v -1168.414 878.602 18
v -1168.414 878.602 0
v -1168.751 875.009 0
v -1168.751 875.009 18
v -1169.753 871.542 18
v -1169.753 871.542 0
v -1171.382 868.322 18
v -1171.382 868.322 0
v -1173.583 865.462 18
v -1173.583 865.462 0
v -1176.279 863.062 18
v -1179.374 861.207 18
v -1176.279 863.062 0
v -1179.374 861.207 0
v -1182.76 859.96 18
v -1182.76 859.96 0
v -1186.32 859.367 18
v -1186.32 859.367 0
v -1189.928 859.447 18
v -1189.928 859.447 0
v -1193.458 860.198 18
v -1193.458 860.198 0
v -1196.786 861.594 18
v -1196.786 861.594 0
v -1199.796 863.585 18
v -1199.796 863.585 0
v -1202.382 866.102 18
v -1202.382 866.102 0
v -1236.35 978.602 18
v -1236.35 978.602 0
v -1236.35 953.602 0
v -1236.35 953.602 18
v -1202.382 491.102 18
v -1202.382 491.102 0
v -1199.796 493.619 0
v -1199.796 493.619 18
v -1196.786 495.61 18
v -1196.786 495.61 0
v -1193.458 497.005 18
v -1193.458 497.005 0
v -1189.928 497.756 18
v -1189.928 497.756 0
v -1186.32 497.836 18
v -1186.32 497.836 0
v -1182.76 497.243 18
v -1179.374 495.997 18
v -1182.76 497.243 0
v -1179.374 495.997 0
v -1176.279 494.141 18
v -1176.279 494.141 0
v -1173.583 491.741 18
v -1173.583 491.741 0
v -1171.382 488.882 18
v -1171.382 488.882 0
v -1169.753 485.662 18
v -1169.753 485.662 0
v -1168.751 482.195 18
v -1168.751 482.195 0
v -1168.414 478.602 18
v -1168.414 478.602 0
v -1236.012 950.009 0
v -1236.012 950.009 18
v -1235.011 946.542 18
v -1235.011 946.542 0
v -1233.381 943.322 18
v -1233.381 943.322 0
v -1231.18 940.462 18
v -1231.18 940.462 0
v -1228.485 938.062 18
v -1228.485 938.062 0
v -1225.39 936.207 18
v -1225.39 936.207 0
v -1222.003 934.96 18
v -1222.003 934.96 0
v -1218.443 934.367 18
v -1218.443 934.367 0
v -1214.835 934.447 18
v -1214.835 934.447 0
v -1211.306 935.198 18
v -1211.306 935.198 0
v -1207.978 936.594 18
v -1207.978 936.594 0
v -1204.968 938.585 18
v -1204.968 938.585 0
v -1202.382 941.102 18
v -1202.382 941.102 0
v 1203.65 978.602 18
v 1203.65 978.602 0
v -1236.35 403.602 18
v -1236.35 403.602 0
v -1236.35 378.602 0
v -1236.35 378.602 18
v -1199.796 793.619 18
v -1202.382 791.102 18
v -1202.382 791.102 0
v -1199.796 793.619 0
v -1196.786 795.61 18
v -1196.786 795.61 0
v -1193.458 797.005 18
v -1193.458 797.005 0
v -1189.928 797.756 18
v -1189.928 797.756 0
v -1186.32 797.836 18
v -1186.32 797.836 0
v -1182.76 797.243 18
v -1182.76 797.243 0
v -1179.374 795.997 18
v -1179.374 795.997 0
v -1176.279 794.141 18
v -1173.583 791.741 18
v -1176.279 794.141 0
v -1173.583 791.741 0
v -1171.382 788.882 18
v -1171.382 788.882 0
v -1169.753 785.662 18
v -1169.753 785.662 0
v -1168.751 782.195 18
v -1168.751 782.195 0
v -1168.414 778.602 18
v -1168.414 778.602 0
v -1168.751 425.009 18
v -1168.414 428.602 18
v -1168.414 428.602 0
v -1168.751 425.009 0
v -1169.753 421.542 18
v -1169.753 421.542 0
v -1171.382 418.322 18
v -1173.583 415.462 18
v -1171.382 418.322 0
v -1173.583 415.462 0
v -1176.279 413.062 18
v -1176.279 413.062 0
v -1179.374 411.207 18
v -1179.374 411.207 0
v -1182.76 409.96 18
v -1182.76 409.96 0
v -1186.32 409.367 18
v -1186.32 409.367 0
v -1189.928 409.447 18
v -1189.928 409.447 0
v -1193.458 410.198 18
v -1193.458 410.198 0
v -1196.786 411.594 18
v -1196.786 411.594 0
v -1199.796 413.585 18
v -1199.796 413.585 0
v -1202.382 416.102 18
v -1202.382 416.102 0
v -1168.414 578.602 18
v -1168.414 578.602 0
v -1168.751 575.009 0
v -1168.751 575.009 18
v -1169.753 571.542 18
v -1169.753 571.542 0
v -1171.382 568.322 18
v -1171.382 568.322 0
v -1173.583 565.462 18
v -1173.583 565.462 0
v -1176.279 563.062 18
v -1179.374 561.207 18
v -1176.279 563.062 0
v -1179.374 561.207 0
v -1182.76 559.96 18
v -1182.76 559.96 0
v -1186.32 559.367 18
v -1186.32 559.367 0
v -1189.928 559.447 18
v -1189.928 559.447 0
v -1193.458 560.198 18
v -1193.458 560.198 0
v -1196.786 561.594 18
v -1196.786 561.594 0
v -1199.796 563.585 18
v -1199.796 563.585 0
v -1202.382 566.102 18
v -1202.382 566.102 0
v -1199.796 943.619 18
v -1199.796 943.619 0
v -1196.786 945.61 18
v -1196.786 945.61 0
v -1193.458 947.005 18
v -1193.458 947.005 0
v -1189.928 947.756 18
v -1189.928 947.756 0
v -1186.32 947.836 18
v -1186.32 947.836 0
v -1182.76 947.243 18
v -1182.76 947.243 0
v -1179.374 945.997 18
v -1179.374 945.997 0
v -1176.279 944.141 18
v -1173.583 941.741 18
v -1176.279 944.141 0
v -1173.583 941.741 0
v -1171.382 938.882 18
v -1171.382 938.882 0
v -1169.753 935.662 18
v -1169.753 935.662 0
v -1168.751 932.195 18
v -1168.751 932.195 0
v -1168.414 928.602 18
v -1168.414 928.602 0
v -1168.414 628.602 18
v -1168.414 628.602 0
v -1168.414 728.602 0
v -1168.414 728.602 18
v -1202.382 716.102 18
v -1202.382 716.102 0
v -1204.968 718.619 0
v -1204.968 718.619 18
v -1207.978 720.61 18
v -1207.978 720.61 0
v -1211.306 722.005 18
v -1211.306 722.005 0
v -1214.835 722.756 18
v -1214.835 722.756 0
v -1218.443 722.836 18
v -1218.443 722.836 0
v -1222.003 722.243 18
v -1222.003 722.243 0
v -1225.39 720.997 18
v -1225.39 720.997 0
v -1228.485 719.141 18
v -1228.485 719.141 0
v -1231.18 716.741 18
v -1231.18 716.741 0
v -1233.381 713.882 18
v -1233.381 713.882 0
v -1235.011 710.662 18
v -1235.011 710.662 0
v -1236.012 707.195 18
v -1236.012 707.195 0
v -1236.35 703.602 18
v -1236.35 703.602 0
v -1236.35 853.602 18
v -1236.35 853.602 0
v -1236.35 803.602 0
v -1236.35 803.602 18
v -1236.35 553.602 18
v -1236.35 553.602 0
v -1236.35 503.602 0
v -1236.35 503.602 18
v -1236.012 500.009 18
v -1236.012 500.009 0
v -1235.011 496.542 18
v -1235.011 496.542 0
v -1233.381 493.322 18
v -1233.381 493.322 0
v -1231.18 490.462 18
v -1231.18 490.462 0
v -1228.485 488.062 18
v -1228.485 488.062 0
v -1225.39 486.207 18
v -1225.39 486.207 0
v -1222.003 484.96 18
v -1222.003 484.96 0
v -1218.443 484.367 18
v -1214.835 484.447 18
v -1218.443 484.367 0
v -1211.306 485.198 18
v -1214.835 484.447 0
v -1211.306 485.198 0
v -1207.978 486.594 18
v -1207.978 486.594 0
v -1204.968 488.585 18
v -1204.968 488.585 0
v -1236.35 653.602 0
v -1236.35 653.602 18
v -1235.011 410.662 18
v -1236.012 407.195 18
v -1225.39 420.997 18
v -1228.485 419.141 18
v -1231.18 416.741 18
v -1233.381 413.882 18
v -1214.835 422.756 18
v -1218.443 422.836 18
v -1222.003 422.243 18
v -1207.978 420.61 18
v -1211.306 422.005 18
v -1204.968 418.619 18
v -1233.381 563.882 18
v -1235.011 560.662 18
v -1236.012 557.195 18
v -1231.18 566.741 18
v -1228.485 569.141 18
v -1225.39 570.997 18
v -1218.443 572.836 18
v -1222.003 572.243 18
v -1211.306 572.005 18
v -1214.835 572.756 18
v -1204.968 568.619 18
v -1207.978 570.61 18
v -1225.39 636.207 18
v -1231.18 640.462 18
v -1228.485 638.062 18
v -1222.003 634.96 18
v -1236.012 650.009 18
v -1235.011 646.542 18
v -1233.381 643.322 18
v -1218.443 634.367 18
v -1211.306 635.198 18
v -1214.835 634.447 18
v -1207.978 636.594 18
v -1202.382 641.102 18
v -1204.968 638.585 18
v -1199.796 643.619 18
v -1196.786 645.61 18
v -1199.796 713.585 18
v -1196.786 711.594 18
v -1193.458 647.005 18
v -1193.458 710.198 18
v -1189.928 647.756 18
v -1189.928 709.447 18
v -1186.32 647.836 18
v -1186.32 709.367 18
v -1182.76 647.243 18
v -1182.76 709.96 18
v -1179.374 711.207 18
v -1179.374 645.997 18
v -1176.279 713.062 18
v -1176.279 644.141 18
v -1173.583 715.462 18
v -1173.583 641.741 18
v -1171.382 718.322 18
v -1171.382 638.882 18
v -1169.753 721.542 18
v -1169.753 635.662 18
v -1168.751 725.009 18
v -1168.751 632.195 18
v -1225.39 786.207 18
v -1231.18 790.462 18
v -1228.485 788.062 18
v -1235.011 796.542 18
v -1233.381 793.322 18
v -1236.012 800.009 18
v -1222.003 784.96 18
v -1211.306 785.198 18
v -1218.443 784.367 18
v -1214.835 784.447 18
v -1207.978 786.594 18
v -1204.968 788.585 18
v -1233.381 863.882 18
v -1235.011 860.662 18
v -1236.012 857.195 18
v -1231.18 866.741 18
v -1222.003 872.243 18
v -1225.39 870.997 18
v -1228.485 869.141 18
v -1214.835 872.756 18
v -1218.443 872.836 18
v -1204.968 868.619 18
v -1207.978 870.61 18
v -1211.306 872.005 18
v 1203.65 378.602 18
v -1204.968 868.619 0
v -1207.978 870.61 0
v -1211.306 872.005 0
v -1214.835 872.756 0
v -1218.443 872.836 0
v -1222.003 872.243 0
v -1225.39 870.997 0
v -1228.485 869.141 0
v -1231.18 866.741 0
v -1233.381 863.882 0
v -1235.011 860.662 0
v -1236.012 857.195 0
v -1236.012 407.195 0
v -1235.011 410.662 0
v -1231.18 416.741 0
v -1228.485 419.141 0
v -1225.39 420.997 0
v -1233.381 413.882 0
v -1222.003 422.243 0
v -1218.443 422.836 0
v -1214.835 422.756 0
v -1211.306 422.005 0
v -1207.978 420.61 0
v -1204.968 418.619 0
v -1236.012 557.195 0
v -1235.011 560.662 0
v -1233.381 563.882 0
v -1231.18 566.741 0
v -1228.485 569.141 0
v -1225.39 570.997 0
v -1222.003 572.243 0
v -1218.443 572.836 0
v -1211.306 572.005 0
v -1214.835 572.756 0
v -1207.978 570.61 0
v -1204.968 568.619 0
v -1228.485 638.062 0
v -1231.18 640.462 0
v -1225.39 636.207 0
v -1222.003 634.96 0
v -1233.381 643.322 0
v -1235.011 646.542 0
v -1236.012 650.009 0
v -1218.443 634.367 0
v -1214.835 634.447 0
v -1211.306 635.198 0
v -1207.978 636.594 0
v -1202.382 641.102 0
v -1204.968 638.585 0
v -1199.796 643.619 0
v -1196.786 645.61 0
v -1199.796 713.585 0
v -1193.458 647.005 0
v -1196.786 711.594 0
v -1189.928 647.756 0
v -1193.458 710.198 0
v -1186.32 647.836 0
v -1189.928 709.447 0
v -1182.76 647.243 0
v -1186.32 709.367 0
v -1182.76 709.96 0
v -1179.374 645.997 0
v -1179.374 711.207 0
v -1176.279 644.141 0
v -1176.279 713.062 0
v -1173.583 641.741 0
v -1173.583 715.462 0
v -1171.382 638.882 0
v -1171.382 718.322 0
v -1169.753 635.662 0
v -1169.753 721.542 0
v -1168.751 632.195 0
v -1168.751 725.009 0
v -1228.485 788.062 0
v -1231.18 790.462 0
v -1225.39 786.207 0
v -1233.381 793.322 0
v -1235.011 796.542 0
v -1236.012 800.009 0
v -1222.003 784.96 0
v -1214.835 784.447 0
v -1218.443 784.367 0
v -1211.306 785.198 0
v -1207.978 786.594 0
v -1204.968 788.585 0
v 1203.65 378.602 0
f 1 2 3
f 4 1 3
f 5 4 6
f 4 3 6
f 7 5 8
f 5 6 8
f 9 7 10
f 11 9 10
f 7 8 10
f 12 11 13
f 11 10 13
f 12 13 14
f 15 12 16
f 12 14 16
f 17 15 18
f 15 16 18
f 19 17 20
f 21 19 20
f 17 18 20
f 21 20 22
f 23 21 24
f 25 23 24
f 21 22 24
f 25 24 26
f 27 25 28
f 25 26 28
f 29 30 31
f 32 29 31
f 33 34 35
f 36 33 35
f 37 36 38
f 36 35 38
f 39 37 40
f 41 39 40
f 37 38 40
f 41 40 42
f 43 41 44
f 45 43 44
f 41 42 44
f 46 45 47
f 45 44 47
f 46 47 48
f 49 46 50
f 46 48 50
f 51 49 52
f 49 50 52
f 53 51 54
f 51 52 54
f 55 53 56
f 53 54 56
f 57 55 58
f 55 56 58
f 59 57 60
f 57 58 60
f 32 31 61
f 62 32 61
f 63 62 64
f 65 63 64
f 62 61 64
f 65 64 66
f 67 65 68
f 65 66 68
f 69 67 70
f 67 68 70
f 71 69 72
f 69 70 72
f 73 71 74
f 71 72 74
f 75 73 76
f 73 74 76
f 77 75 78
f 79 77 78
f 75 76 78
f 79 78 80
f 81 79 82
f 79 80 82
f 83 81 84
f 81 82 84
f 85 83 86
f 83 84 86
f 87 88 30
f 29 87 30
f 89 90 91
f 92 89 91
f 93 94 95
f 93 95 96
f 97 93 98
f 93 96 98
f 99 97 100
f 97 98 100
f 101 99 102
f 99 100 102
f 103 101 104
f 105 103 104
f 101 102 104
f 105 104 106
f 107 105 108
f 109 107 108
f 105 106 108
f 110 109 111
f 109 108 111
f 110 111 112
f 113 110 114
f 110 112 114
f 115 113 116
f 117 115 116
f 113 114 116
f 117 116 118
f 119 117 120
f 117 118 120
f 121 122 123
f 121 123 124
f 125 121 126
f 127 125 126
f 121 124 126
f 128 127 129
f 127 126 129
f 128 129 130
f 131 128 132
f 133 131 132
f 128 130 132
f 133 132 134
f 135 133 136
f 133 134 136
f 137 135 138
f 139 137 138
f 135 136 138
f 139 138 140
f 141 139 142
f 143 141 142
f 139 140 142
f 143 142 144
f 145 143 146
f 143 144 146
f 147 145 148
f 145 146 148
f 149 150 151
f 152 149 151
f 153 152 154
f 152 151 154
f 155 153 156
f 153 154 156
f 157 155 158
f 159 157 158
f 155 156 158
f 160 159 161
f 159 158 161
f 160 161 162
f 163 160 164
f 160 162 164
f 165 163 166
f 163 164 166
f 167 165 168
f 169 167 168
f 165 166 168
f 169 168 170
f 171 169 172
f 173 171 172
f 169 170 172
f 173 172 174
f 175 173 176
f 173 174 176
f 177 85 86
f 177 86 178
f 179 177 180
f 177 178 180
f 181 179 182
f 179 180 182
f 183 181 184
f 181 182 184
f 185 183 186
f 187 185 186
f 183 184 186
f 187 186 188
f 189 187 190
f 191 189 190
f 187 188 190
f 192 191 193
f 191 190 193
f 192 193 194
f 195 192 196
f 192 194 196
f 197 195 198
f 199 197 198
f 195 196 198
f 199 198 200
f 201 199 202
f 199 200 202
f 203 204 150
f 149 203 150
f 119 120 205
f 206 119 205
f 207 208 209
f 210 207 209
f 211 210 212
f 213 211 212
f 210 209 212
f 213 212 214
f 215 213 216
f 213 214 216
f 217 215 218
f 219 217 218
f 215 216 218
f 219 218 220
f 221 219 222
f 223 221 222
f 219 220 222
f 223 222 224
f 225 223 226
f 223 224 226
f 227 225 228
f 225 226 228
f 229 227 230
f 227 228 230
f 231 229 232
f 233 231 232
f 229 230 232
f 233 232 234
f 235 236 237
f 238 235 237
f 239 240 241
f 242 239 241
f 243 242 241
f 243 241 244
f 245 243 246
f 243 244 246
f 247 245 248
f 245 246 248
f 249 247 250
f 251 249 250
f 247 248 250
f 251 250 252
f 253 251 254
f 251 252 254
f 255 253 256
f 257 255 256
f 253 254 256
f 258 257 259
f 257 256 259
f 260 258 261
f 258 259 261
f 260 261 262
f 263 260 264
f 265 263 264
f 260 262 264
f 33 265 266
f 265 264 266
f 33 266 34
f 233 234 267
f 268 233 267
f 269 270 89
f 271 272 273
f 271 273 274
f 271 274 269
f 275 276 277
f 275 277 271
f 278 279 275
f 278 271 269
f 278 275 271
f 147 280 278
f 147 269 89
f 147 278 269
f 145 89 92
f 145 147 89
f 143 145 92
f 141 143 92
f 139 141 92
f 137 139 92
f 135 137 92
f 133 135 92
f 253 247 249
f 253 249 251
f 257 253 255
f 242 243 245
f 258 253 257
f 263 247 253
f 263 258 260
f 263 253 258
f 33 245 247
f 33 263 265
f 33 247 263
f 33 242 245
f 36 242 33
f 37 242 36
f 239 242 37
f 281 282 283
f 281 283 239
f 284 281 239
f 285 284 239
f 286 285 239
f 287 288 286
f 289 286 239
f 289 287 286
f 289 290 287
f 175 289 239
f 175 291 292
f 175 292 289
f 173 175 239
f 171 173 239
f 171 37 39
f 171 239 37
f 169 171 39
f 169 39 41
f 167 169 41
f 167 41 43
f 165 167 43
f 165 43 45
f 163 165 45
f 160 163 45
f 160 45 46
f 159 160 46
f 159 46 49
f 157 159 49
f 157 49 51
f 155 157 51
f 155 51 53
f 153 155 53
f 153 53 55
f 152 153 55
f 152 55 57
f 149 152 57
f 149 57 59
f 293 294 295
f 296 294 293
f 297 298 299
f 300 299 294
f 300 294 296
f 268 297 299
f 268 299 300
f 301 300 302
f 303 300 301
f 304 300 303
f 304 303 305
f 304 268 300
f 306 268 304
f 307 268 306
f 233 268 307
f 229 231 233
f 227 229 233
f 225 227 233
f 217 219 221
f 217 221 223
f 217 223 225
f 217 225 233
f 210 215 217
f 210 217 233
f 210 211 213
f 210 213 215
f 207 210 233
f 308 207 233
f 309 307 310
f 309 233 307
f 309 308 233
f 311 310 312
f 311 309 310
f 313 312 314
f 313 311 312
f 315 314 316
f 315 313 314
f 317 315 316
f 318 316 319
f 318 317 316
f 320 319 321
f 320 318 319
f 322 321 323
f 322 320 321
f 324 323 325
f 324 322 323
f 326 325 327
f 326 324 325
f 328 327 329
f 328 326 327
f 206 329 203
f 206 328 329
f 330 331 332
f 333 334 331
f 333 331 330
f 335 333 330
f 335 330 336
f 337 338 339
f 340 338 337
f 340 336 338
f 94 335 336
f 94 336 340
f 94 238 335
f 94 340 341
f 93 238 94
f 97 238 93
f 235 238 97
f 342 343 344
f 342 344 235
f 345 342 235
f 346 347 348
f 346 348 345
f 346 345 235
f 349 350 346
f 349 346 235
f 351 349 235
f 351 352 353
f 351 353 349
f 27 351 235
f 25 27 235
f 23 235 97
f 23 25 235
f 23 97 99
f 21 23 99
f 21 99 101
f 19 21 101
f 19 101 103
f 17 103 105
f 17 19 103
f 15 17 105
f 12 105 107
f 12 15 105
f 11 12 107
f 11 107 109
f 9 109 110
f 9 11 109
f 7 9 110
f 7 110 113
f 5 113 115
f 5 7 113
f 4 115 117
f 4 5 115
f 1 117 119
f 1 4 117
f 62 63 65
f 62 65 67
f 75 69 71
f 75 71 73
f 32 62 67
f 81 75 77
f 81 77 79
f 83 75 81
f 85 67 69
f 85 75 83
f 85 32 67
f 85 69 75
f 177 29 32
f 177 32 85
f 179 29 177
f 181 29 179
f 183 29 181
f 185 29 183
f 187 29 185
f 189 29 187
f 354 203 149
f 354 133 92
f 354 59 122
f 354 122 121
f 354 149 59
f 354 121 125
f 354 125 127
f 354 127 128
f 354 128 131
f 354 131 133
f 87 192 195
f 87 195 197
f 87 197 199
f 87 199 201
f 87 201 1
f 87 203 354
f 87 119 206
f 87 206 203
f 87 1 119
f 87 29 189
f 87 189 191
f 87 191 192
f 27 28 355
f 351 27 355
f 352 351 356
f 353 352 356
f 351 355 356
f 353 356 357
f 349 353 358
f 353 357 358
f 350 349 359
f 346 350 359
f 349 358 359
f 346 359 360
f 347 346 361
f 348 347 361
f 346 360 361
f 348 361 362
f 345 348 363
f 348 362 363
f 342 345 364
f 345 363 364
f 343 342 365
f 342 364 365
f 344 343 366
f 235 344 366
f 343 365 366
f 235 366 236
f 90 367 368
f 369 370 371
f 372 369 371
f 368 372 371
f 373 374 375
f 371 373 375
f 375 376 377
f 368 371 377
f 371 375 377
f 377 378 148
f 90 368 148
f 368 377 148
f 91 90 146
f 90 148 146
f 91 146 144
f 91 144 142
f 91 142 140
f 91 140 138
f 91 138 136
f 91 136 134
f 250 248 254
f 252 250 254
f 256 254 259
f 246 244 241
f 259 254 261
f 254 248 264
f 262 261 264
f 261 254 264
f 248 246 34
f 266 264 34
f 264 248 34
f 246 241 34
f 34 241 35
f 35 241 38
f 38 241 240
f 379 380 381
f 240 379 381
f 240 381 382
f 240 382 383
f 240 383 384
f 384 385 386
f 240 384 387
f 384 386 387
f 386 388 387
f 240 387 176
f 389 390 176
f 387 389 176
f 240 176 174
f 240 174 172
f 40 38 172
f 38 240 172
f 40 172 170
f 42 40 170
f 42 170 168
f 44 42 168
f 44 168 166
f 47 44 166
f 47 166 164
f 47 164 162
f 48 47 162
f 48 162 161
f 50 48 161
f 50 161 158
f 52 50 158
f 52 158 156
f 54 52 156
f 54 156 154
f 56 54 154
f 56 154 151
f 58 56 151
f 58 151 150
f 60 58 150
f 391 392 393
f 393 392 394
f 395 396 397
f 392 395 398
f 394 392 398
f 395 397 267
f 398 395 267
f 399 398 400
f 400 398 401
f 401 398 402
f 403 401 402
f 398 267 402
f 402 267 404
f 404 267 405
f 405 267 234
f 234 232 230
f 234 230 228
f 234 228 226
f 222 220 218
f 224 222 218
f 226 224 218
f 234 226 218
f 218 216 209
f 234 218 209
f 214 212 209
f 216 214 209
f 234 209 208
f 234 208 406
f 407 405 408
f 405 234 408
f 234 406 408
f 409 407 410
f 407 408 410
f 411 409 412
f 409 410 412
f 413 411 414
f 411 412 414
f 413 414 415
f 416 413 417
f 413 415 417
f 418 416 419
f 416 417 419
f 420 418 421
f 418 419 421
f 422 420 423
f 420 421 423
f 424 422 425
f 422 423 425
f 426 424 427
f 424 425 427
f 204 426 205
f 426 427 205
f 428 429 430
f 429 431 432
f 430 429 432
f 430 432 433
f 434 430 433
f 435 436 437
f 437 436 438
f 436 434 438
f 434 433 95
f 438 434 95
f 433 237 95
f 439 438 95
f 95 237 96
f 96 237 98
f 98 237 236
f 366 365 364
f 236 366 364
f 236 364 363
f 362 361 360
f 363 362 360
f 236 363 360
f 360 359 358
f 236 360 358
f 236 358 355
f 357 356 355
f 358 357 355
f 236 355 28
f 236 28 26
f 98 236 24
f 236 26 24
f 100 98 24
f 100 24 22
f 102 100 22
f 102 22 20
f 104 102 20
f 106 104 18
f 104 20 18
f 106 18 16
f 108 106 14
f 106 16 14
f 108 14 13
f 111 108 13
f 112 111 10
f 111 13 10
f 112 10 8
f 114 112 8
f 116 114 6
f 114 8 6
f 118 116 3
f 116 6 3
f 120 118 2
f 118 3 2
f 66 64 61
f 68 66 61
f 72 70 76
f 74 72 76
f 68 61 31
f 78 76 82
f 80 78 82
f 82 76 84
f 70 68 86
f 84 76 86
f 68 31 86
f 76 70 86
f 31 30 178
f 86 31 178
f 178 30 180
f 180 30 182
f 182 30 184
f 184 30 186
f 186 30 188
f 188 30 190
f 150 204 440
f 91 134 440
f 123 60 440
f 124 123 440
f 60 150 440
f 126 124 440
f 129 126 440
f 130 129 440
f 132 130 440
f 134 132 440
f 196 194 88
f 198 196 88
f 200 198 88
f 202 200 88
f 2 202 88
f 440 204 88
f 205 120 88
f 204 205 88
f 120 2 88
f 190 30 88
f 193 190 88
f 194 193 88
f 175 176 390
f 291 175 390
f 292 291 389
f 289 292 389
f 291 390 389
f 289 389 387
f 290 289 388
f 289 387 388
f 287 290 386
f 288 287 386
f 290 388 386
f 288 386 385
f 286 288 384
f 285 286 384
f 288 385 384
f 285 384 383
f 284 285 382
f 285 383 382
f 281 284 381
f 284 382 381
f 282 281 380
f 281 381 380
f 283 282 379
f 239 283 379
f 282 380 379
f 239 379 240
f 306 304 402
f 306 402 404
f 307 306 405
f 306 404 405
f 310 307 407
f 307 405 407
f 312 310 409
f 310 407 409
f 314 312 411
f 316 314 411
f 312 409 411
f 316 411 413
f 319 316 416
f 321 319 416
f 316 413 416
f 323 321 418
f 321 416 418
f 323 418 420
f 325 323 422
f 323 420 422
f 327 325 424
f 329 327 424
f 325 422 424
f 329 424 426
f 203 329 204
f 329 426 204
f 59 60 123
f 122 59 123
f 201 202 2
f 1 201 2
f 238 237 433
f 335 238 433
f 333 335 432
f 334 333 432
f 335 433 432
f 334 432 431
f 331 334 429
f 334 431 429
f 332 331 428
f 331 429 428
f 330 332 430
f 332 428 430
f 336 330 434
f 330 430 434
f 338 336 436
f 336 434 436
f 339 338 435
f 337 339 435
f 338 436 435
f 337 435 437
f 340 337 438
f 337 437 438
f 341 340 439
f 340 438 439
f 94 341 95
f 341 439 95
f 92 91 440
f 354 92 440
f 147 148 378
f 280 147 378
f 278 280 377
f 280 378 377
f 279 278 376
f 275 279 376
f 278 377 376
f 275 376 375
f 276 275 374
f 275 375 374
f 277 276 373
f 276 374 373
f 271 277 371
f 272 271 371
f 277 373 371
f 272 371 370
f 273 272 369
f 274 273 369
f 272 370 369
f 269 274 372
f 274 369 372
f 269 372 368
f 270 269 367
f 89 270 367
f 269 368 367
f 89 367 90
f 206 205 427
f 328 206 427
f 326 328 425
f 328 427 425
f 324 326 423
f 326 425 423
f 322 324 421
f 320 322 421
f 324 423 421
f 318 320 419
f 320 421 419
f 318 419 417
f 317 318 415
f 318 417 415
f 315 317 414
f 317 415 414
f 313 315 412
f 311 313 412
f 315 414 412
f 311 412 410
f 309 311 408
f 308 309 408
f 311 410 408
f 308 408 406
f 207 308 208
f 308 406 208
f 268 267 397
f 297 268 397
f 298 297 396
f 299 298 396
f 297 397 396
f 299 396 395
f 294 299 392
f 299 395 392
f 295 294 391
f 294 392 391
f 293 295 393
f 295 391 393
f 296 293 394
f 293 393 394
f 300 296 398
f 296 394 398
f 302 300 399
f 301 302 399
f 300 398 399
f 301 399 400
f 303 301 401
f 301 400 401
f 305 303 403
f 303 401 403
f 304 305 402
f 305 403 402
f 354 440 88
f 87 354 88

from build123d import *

# Parameters (mm, degrees)
F1_DEPTH = 18


with BuildPart() as f1:
    # F0 (on Top) → F1 (new body)
    with BuildSketch(Plane.XY):
        with BuildLine():
            Line((1203.650336, 978.601654), (-1236.349664, 978.601654))
            Line((-1236.349664, 978.601654), (-1236.349664, 953.601654))
            ThreePointArc((-1236.349664, 953.601654), (-1223.725461, 935.504177), (-1202.381669, 941.101654))
            ThreePointArc((-1202.381669, 941.101654), (-1181.037877, 946.699132), (-1168.413673, 928.601654))
            Line((-1168.413673, 928.601654), (-1168.413673, 903.601654))
            Line((-1168.413673, 903.601654), (-1168.413673, 878.601654))
            ThreePointArc((-1168.413673, 878.601654), (-1181.037877, 860.504177), (-1202.381669, 866.101654))
            ThreePointArc((-1202.381669, 866.101654), (-1223.725461, 871.699132), (-1236.349664, 853.601654))
            Line((-1236.349664, 853.601654), (-1236.349664, 803.601654))
            ThreePointArc((-1236.349664, 803.601654), (-1223.725461, 785.504177), (-1202.381669, 791.101654))
            ThreePointArc((-1202.381669, 791.101654), (-1181.037877, 796.699132), (-1168.413673, 778.601654))
            Line((-1168.413673, 778.601654), (-1168.413673, 753.601654))
            Line((-1168.413673, 753.601654), (-1168.413673, 728.601654))
            ThreePointArc((-1168.413673, 728.601654), (-1181.037877, 710.504177), (-1202.381669, 716.101654))
            ThreePointArc((-1202.381669, 716.101654), (-1223.725461, 721.699132), (-1236.349664, 703.601654))
            Line((-1236.349664, 703.601654), (-1236.349664, 653.601654))
            ThreePointArc((-1236.349664, 653.601654), (-1223.725461, 635.504177), (-1202.381669, 641.101654))
            ThreePointArc((-1202.381669, 641.101654), (-1181.037877, 646.699132), (-1168.413673, 628.601654))
            Line((-1168.413673, 628.601654), (-1168.413673, 603.601654))
            Line((-1168.413673, 603.601654), (-1168.413673, 578.601654))
            ThreePointArc((-1168.413673, 578.601654), (-1181.037877, 560.504177), (-1202.381669, 566.101654))
            ThreePointArc((-1202.381669, 566.101654), (-1223.725461, 571.699132), (-1236.349664, 553.601654))
            Line((-1236.349664, 553.601654), (-1236.349664, 503.601654))
            ThreePointArc((-1236.349664, 503.601654), (-1223.725461, 485.504177), (-1202.381669, 491.101654))
            ThreePointArc((-1202.381669, 491.101654), (-1181.037877, 496.699132), (-1168.413673, 478.601654))
            Line((-1168.413673, 478.601654), (-1168.413673, 453.601654))
            Line((-1168.413673, 453.601654), (-1168.413673, 428.601654))
            ThreePointArc((-1168.413673, 428.601654), (-1181.037877, 410.504177), (-1202.381669, 416.101654))
            ThreePointArc((-1202.381669, 416.101654), (-1223.725461, 421.699132), (-1236.349664, 403.601654))
            Line((-1236.349664, 403.601654), (-1236.349664, 378.601654))
            Line((-1236.349664, 378.601654), (1203.650336, 378.601654))
            Line((1203.650336, 378.601654), (1203.650336, 978.601654))
        make_face()
    extrude(amount=F1_DEPTH)


solid = f1.part
